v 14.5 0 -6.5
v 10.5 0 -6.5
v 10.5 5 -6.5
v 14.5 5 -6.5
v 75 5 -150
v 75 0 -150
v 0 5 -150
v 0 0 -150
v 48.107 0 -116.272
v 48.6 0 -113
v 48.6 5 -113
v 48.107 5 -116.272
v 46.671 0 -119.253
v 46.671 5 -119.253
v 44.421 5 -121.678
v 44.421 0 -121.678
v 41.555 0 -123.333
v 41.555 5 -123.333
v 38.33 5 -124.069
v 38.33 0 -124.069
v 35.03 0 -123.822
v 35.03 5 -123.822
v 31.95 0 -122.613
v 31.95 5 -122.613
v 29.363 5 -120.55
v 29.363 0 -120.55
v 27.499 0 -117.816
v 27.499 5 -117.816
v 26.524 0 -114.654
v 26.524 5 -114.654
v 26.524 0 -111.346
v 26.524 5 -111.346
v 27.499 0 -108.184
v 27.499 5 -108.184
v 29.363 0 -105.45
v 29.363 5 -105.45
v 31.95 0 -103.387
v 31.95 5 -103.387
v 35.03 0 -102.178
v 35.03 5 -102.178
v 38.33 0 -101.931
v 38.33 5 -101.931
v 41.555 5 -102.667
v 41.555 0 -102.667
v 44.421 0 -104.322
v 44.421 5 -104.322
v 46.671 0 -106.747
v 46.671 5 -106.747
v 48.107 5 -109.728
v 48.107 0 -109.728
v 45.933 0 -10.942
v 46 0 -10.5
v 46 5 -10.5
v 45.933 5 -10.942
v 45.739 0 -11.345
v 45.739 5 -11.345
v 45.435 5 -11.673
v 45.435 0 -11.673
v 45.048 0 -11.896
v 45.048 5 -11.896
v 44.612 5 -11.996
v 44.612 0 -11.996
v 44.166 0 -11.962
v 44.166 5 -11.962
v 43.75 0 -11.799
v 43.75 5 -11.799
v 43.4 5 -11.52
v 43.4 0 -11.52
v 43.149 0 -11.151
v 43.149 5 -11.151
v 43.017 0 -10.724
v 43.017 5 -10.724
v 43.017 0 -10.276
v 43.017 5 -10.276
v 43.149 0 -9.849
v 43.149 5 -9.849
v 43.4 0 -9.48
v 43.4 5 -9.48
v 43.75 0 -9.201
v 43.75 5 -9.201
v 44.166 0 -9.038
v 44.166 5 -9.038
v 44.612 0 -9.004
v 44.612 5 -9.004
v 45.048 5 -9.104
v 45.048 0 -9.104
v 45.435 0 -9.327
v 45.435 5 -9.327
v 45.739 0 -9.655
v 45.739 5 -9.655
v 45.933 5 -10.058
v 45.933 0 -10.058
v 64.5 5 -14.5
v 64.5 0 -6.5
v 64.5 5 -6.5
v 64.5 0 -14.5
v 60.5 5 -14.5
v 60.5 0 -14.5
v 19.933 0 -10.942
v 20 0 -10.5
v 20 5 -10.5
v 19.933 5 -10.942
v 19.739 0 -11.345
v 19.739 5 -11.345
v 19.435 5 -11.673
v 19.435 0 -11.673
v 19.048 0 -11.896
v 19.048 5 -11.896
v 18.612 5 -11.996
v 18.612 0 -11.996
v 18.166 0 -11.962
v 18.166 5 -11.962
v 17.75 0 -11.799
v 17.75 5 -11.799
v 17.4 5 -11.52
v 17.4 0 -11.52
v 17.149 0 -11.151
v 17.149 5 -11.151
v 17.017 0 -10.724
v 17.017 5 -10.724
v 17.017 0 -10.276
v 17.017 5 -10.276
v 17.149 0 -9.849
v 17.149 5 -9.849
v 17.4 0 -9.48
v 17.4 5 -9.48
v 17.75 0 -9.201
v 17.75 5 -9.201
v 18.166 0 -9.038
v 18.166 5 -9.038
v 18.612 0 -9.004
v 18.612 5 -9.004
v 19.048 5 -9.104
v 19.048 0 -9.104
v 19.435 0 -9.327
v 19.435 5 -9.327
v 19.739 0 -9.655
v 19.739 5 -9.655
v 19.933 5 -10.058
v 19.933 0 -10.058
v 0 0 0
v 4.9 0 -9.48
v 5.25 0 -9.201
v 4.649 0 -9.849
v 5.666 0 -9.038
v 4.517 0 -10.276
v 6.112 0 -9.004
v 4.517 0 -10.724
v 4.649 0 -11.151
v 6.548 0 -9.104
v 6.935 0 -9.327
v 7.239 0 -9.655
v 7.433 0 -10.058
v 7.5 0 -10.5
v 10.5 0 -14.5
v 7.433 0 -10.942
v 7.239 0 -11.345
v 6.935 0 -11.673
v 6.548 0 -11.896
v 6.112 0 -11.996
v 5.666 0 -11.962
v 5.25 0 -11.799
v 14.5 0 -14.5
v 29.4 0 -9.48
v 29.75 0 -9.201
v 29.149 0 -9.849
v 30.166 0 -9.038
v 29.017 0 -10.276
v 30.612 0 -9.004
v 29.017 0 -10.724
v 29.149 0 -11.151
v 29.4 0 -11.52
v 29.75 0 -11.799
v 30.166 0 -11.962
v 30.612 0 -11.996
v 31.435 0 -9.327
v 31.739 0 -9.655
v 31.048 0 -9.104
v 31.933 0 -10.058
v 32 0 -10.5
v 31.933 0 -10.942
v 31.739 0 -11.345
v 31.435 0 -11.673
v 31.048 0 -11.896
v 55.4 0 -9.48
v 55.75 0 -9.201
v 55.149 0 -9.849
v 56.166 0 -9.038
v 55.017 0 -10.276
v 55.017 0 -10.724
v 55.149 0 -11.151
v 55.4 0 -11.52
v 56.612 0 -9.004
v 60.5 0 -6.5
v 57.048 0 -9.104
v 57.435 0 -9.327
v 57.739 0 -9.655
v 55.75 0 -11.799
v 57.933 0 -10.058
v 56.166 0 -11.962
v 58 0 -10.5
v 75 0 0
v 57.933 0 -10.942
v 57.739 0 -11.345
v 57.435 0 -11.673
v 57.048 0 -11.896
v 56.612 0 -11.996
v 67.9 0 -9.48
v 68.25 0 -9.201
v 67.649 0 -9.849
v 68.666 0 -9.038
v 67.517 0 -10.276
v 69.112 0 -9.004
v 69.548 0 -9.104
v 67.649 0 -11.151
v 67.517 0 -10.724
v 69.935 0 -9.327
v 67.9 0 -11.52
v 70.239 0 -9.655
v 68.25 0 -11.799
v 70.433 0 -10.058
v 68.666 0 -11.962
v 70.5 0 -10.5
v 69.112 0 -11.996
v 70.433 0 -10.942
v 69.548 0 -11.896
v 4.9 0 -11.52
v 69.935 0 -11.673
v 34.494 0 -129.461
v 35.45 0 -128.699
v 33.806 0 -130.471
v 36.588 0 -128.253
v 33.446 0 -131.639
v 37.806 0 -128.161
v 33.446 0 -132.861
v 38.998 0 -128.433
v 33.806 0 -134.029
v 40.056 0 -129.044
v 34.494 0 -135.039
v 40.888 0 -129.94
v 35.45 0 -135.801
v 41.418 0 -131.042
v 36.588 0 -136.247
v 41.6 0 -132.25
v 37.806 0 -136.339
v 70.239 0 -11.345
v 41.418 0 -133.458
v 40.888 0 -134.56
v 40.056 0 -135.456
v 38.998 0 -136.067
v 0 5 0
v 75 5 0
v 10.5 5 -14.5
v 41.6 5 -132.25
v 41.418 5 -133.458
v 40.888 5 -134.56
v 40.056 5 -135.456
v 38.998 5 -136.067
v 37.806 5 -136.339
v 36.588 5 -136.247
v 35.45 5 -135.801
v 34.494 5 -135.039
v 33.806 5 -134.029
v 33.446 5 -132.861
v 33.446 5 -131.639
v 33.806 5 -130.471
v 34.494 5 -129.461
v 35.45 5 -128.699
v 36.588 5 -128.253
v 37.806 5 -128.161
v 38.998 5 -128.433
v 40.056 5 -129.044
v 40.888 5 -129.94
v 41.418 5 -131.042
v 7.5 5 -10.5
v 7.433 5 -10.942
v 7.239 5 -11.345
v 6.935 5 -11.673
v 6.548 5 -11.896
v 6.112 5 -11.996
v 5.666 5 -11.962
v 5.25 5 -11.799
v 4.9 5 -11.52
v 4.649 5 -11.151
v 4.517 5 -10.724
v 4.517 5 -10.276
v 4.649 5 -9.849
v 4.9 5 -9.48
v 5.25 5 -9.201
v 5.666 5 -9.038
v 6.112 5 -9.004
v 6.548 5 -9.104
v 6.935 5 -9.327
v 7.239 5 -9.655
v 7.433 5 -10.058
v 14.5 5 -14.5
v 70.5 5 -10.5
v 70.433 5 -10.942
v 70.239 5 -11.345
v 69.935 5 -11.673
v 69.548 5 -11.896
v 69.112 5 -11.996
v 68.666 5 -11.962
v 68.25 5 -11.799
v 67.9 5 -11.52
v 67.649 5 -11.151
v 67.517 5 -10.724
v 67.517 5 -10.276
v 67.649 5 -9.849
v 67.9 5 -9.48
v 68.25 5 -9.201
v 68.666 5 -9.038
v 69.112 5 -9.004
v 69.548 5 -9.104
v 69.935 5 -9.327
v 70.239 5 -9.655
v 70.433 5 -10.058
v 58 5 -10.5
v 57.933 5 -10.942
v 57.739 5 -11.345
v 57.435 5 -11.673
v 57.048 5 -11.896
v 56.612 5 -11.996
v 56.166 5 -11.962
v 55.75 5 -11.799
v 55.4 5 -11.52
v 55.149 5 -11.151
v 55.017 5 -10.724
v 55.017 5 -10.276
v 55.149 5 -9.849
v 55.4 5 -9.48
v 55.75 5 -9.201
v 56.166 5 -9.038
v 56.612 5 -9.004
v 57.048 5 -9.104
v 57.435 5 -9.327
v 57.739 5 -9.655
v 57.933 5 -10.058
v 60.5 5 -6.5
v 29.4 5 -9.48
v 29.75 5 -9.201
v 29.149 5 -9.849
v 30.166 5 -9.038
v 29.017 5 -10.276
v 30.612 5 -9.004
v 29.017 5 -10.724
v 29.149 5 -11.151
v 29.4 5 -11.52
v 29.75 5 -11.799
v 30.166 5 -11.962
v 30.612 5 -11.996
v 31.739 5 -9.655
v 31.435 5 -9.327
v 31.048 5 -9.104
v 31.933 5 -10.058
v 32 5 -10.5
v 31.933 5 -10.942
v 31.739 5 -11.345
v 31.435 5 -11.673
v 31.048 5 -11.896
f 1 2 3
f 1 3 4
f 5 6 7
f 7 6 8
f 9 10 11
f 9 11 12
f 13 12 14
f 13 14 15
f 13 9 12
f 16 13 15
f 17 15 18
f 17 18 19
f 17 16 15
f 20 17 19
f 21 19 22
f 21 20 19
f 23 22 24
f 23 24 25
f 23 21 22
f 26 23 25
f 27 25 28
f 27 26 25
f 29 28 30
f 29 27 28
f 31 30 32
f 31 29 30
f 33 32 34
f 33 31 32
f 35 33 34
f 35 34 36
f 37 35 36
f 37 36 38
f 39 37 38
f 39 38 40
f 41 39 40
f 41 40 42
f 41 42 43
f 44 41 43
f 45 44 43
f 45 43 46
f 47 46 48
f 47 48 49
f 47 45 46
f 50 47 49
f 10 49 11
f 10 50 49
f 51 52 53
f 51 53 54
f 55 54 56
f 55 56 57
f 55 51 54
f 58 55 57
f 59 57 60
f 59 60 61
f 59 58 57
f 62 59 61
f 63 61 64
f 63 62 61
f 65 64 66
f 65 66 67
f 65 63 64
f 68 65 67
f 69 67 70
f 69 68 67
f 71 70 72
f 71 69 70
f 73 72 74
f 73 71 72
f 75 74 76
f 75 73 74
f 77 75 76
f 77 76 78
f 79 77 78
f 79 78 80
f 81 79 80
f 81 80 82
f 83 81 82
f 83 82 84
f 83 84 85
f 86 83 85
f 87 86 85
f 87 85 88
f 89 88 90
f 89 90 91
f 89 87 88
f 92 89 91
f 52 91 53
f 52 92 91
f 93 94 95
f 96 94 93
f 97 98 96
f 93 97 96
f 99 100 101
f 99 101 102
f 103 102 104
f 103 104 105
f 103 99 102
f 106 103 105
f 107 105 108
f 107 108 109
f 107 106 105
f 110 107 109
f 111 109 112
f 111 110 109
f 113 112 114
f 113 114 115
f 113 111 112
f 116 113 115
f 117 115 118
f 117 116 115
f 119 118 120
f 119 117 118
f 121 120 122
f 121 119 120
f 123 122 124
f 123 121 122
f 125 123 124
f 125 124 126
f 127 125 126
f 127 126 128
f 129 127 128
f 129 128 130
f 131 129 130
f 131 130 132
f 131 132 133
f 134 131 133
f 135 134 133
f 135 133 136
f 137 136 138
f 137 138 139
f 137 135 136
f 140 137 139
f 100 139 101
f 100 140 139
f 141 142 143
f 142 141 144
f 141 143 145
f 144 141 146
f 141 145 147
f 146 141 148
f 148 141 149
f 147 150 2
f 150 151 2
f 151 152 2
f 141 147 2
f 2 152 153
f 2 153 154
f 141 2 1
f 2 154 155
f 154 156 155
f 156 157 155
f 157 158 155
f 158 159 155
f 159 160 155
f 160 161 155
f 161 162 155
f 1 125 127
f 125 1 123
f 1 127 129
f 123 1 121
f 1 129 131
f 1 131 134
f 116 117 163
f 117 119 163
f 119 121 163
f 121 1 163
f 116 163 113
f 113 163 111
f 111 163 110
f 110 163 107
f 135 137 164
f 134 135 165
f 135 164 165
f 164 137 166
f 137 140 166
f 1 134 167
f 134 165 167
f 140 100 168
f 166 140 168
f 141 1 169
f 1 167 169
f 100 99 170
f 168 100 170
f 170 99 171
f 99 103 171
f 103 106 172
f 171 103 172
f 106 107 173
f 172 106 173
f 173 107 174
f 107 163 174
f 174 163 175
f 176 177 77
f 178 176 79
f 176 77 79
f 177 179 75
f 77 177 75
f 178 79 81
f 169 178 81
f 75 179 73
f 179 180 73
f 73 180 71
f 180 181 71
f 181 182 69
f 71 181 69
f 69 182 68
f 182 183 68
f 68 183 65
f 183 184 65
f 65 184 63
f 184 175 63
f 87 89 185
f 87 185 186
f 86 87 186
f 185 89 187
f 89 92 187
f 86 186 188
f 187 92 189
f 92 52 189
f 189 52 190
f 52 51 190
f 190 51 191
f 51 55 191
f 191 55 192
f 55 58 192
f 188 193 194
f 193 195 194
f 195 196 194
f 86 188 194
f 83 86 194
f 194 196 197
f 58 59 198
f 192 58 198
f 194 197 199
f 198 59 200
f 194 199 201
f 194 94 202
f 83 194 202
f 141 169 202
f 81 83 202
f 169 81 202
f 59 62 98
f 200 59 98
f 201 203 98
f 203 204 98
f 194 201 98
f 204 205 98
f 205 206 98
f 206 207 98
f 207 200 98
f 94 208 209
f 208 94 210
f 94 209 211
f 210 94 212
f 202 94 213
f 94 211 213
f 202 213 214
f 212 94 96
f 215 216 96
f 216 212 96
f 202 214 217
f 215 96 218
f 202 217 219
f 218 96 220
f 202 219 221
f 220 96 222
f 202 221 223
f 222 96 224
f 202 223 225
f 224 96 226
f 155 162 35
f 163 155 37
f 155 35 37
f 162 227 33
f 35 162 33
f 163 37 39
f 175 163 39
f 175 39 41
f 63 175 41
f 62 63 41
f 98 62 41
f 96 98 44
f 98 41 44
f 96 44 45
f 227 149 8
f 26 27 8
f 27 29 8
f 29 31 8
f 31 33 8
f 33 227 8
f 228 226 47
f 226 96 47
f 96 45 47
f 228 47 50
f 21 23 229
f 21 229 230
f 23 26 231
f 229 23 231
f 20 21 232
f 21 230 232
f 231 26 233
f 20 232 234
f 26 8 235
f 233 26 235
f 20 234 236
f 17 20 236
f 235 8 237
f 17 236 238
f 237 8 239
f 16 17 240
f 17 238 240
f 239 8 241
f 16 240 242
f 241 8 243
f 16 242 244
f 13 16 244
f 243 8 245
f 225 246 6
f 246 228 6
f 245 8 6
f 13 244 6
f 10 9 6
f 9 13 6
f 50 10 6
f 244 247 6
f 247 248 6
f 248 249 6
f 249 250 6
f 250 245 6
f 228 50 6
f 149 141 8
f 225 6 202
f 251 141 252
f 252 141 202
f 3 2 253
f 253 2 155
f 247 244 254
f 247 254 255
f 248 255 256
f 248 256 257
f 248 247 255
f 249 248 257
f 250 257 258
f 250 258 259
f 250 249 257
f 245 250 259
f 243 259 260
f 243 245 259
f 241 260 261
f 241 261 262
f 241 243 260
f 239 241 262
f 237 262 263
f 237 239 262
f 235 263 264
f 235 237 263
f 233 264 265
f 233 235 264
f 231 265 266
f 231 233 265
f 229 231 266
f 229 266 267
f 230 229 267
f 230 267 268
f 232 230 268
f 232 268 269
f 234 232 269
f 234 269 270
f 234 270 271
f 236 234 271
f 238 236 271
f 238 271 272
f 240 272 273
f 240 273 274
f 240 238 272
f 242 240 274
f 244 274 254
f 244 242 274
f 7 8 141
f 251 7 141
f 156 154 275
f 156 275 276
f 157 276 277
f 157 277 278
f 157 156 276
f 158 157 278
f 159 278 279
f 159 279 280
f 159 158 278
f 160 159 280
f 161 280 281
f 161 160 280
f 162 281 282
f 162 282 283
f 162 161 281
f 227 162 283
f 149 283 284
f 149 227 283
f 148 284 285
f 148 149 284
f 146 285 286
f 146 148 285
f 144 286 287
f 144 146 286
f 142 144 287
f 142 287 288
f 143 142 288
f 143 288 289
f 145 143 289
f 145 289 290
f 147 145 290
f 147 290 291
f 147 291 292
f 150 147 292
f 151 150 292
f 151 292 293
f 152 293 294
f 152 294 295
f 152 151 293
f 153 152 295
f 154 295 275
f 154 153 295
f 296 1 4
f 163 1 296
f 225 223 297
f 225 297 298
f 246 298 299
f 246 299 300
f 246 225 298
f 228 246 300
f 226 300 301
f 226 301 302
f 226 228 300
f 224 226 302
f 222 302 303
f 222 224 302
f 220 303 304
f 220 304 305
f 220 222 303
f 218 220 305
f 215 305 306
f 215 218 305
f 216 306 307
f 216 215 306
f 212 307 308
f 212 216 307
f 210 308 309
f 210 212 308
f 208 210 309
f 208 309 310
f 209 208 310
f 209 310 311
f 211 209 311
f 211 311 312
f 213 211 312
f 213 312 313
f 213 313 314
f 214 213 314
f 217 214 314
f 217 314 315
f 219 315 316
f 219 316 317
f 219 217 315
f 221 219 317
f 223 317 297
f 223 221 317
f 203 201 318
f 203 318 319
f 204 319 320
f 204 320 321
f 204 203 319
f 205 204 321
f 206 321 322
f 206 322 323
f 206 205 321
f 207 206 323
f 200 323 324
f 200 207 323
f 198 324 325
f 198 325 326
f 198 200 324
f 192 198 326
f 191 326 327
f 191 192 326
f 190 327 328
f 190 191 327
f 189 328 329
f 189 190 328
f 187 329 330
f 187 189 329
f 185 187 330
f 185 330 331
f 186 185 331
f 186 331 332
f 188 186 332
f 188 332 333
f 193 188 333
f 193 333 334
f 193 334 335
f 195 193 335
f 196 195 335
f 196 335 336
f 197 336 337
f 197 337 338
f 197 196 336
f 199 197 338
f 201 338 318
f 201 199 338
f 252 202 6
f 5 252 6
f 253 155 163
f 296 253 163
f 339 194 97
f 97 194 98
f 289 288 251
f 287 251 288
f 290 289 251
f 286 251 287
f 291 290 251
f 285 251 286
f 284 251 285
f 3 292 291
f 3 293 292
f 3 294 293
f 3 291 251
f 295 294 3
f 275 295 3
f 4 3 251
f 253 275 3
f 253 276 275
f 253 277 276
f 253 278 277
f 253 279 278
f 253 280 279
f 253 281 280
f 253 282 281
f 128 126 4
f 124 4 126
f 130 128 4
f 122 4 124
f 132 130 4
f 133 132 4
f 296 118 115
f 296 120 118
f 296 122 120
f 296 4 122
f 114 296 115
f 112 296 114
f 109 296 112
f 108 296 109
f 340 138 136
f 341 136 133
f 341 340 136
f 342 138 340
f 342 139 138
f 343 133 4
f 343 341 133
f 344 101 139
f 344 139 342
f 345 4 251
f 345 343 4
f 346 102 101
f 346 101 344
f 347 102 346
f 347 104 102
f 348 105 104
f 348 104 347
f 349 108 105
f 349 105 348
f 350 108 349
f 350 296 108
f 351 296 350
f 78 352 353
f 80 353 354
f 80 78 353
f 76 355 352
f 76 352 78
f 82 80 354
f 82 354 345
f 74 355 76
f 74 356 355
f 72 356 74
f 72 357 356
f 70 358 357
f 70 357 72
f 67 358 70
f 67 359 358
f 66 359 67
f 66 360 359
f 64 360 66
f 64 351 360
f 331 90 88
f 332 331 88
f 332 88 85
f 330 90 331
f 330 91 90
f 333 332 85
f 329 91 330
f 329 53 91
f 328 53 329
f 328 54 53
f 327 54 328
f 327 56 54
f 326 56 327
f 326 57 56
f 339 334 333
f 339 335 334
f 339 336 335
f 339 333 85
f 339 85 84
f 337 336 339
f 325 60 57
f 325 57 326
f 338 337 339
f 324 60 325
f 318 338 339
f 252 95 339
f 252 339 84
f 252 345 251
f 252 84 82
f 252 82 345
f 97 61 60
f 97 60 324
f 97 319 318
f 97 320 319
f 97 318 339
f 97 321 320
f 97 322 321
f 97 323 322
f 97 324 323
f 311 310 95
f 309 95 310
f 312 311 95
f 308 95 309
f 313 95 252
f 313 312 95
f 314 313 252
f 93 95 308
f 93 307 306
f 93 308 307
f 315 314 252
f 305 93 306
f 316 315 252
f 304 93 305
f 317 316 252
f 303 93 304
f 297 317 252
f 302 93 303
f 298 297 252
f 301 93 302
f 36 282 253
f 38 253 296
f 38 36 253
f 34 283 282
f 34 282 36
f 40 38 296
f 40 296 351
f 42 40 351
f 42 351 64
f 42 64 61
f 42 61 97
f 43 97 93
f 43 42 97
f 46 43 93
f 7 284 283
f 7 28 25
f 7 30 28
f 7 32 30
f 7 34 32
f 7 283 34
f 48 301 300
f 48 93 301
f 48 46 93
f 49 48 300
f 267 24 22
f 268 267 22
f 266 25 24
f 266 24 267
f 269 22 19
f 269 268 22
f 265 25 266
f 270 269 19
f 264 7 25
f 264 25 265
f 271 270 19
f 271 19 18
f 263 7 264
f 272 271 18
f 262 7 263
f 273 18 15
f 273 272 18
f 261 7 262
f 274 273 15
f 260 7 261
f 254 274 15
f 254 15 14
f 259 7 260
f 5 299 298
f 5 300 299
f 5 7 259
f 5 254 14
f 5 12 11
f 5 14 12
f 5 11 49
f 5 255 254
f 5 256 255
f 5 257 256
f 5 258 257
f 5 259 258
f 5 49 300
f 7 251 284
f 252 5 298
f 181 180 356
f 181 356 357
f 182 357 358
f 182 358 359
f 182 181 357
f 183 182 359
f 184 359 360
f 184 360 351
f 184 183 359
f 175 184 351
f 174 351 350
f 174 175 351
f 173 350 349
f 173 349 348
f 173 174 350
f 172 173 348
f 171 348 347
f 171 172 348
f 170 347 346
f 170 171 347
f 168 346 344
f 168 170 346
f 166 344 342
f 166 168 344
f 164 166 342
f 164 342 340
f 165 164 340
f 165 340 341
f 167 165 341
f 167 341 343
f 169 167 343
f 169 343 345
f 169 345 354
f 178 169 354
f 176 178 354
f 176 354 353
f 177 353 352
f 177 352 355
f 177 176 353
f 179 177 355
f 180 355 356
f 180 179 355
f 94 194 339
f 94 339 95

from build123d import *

# Parameters (mm, degrees)
SKETCH_1_R      = 1.5
SKETCH_1_W      = 4
SKETCH_1_H      = 8
SKETCH_1_R_2    = 4.1
SKETCH_1_R_3    = 11.1
EXTRUDE_6_DEPTH = 5


with BuildPart() as part:
    # 草图1 → 凸台-拉伸6 (new body)
    with BuildSketch(Plane(origin=(0, 0, 0), x_dir=(1, 0, 0), z_dir=(0, 1, 0))):
        Polygon((75, 150), (37.5, 150), (0, 150), (0, 0), (75, 0), align=None)
        with Locations((6, 10.5)):
            Circle(SKETCH_1_R, mode=Mode.SUBTRACT)
        with Locations((12.5, 10.5)):
            Rectangle(SKETCH_1_W, SKETCH_1_H, mode=Mode.SUBTRACT)
        with Locations((18.5, 10.5)):
            Circle(SKETCH_1_R, mode=Mode.SUBTRACT)
        with Locations((30.5, 10.5)):
            Circle(SKETCH_1_R, mode=Mode.SUBTRACT)
        with Locations((44.5, 10.5)):
            Circle(SKETCH_1_R, mode=Mode.SUBTRACT)
        with Locations((56.5, 10.5)):
            Circle(SKETCH_1_R, mode=Mode.SUBTRACT)
        with Locations((62.5, 10.5)):
            Rectangle(SKETCH_1_W, SKETCH_1_H, mode=Mode.SUBTRACT)
        with Locations((69, 10.5)):
            Circle(SKETCH_1_R, mode=Mode.SUBTRACT)
        with Locations((37.5, 132.25)):
            Circle(SKETCH_1_R_2, mode=Mode.SUBTRACT)
        with Locations((37.5, 113)):
            Circle(SKETCH_1_R_3, mode=Mode.SUBTRACT)
    extrude(amount=EXTRUDE_6_DEPTH)


solid = part.part
